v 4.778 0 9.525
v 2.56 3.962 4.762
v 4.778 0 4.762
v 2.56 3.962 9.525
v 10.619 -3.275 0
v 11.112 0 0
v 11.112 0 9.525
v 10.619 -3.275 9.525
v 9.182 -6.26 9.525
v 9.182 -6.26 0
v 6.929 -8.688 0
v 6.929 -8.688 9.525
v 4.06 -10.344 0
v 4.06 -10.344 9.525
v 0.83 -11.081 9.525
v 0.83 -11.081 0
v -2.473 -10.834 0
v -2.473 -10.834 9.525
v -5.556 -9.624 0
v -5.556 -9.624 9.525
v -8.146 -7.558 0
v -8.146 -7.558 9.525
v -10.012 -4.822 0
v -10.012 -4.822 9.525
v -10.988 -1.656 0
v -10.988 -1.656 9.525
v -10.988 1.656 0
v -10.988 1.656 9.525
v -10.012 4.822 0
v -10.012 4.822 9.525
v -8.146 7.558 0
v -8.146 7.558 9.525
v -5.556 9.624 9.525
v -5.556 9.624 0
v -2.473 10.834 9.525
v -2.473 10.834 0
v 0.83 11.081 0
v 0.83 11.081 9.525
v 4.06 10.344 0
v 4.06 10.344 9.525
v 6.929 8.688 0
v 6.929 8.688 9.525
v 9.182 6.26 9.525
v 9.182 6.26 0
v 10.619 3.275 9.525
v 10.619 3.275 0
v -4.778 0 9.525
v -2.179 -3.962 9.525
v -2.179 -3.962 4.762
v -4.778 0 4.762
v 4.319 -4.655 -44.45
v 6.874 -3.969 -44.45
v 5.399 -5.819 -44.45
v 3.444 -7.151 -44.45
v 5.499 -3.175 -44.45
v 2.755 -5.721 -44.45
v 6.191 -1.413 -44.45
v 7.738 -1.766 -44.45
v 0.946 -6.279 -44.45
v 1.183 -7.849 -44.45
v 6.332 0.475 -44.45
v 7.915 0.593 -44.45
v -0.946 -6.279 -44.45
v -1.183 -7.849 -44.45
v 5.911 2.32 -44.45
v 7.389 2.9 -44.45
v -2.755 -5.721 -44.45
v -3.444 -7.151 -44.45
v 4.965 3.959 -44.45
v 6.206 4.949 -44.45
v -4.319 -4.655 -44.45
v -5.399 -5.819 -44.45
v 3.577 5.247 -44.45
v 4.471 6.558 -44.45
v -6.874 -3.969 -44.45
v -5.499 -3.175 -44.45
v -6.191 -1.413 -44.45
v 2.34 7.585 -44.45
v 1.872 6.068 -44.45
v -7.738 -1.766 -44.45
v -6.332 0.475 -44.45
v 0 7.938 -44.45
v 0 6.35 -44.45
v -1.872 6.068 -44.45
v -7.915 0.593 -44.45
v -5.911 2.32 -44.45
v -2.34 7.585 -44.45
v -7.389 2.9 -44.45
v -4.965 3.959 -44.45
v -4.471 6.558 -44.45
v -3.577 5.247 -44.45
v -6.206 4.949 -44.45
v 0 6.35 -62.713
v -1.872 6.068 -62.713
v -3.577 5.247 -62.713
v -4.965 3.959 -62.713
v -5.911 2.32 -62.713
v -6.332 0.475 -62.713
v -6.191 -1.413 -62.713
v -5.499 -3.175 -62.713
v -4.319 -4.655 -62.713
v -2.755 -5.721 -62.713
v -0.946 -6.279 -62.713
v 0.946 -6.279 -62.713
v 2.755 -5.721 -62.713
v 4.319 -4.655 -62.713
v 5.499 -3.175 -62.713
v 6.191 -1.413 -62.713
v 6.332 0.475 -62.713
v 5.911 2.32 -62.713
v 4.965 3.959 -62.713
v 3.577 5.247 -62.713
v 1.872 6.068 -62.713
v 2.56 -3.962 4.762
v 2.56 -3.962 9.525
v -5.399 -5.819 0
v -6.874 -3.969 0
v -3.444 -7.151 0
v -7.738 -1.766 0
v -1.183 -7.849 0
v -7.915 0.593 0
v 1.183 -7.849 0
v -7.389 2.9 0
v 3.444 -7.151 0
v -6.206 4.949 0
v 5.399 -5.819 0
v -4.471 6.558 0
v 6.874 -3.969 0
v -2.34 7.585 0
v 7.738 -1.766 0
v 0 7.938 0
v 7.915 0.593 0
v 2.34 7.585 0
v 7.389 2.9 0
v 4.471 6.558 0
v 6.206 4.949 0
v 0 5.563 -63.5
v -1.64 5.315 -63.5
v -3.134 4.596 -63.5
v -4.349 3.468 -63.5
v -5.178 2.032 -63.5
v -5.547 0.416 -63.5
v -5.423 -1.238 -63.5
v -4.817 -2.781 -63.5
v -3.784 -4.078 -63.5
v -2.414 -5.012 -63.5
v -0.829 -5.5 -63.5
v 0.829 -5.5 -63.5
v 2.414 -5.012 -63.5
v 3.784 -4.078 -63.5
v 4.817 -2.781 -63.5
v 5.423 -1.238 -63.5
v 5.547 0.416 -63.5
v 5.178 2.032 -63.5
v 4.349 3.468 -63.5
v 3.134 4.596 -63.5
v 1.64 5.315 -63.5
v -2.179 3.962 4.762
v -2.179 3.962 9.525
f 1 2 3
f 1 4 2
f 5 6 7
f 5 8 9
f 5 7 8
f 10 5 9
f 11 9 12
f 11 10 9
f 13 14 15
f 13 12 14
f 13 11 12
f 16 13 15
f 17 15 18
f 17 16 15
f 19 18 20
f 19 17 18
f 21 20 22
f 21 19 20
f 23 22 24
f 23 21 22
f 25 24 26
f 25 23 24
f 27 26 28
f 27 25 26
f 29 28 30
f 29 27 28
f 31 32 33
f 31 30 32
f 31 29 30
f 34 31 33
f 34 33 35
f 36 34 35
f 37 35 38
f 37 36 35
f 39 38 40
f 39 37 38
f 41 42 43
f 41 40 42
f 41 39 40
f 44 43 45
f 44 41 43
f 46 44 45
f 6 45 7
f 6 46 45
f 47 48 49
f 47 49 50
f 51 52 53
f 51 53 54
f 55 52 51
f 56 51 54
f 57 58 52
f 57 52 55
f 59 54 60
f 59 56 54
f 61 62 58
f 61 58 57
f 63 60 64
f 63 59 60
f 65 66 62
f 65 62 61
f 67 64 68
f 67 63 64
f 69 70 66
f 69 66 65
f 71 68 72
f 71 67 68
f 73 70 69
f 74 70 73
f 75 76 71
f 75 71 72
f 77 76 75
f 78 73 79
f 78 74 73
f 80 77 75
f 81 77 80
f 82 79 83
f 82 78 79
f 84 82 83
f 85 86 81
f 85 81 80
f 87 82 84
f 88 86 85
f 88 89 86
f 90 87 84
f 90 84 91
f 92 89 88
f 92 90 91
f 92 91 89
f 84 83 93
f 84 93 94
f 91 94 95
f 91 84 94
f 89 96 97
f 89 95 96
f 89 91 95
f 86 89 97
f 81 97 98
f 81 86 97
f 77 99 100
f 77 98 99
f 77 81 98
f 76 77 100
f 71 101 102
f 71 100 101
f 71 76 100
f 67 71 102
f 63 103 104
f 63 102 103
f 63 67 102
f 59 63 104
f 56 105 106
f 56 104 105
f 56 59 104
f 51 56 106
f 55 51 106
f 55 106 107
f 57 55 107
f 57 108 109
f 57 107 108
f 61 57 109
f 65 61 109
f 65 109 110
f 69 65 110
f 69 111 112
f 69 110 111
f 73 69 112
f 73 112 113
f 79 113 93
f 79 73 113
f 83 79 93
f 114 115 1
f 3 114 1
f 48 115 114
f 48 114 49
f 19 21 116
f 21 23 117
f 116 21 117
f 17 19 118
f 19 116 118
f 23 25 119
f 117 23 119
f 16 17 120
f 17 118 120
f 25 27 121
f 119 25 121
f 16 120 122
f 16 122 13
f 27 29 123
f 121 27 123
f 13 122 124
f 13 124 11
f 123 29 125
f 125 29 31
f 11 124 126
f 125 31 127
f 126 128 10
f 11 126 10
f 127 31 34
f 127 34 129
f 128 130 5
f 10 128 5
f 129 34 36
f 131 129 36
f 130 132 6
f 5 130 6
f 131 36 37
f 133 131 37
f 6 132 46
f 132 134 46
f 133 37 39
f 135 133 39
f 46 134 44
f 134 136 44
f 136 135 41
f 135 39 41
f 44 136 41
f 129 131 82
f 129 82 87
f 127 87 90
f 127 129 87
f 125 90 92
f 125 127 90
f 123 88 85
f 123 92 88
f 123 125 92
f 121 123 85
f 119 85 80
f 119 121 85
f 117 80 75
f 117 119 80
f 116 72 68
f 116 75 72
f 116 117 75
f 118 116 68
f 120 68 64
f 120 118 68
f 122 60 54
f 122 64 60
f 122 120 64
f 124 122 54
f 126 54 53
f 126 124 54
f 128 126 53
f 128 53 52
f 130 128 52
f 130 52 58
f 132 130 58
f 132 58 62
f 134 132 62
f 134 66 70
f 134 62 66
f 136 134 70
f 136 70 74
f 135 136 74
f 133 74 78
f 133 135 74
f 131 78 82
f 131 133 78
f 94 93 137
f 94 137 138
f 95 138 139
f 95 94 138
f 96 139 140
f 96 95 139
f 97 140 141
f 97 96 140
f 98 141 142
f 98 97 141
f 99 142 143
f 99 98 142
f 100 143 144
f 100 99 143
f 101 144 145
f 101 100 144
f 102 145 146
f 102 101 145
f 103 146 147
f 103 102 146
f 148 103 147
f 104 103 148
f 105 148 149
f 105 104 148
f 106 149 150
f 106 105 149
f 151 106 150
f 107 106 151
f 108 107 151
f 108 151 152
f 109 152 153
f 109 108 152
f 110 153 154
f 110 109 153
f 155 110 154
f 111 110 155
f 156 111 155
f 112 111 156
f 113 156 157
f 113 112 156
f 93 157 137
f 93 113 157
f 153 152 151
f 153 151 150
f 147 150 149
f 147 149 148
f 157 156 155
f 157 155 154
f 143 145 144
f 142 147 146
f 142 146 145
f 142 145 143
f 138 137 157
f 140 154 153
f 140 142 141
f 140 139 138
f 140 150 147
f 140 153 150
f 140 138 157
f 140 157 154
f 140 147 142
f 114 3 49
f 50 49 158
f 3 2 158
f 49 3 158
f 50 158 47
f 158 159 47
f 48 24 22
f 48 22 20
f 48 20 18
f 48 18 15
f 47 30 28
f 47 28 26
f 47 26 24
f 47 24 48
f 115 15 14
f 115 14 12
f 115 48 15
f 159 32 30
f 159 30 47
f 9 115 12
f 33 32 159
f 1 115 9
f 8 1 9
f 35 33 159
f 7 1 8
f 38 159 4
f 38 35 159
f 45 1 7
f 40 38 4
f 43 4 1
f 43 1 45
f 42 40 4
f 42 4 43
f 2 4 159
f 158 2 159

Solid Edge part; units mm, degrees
sketch "Sketch1" plane through (0, 0, 0) normal (0, 0, 1) x (1, 0, 0)
  circle A0 centre (0, 0) radius 11.1125
  dimension "D1" = 22.225
extrude "Protrusion1" add sketch "Sketch1" along normal blind 9.525
sketch "Sketch2" plane through (0, 0, 0) normal (0, 0, -1) x (0, 1, 0)
  circle A0 centre (0, 0) radius 7.9375
  dimension "D1" = 15.875
extrude "Protrusion2" add sketch "Sketch2" along normal blind 44.45
sketch "Sketch3" plane through (0, 0, -44.45) normal (0, 0, -1) x (0, 1, 0)
  circle A0 centre (0, 0) radius 6.35
  dimension "D1" = 12.7
extrude "Protrusion3" add sketch "Sketch3" along normal blind 19.05
sketch "Sketch4" plane through (0, 0, 9.525) normal (0, 0, 1) x (0, 1, 0)
  line L0 (-3.9624, 2.1791) -> (0, 4.7782)
  line L1 (-3.9624, -2.5597) -> (-3.9624, 2.1791)
  line L2 (-3.9624, -2.5597) -> (0, -4.7782)
  line L3 (3.9624, -2.5597) -> (0, -4.7782)
  line L4 (3.9624, -2.5597) -> (3.9624, 2.1791)
  line L5 (3.9624, 2.1791) -> (0, 4.7782)
  dimension "D1" = 7.9248
extrude "Cutout1" cut sketch "Sketch4" against normal blind 4.7625
chamfer "Chamfer1" distance 0.7874 angle 45 1 edges at (0, -6.35, -63.5)
properties part number "24104955"
